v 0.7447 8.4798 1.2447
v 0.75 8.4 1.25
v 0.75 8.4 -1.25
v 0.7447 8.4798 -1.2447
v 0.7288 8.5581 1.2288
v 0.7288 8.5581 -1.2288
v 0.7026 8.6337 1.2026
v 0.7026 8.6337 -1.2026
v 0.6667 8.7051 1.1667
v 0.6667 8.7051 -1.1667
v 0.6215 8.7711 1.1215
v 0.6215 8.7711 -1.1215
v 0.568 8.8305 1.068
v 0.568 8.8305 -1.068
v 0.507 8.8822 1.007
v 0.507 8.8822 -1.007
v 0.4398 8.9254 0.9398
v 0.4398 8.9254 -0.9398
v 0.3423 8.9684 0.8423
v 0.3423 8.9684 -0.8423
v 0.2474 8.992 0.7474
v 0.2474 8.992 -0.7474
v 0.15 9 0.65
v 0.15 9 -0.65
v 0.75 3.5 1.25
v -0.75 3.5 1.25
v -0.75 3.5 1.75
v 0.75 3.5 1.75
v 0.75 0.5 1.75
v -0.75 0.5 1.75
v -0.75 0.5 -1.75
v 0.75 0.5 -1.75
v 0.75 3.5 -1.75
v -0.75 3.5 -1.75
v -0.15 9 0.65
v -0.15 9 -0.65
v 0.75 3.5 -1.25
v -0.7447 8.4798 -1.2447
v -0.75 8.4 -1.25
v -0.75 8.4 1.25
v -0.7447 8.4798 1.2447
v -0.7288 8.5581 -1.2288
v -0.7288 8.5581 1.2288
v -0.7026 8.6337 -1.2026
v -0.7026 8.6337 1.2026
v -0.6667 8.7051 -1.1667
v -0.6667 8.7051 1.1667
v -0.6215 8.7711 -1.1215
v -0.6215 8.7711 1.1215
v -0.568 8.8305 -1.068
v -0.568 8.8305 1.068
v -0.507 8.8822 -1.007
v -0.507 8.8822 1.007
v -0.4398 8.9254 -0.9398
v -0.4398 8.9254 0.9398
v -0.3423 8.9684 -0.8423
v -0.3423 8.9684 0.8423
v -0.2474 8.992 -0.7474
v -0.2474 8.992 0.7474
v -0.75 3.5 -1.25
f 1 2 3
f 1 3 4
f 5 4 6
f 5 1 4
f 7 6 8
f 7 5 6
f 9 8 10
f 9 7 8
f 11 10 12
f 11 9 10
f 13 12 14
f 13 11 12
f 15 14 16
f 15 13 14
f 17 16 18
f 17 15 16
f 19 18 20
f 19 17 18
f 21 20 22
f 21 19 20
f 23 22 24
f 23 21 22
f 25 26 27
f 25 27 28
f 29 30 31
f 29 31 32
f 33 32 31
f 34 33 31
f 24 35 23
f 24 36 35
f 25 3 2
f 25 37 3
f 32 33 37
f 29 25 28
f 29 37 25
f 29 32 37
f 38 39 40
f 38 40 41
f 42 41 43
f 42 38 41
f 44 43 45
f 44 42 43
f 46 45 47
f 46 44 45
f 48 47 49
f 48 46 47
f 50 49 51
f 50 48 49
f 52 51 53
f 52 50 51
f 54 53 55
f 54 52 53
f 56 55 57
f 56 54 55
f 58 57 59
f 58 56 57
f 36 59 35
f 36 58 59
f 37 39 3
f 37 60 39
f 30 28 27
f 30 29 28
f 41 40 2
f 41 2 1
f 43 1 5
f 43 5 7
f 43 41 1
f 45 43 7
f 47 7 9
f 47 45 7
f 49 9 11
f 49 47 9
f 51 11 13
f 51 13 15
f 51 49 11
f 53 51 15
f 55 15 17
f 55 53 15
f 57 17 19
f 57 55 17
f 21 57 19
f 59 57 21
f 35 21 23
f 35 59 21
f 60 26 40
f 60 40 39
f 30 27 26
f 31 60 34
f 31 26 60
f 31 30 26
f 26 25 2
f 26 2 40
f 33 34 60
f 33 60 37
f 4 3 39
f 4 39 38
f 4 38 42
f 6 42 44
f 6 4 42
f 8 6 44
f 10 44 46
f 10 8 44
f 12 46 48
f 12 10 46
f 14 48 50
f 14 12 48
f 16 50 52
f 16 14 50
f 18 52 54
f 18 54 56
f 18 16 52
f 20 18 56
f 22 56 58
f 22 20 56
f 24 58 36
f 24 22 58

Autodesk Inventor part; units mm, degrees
ref_plane "YZ Plane" through (0, 0, 0) normal (1, 0, 0) x (0, 1, 0)
ref_plane "XZ Plane" through (0, 0, 0) normal (0, 1, 0) x (-1, 0, 0)
ref_plane "XY Plane" through (0, 0, 0) normal (0, 0, 1) x (1, 0, 0)
sketch "Sketch1" plane through (0, 0, 0) normal (0, 1, 0) x (-1, 0, 0)
  line L0 (-0.75, -1.6) -> (0.75, -1.6)
  line L1 (0.75, -1.6) -> (0.75, 1.6)
  line L2 (0.75, 1.6) -> (-0.75, 1.6)
  line L3 (-0.75, 1.6) -> (-0.75, -1.6)
  line L4 (-0.75, -1.6) -> (0.75, 1.6) construction
  line L5 (0.75, -1.6) -> (-0.75, 1.6) construction
  line L6 (0.75, 1.6) -> (-0.75, 1.6)
  line L7 (-0.75, 1.6) -> (-0.75, 2.6)
  line L8 (-0.75, 2.6) -> (0.75, 2.6)
  line L9 (0.75, 2.6) -> (0.75, 1.6)
  line L10 (-0.75, -1.6) -> (0.75, -1.6)
  line L11 (0.75, -1.6) -> (0.75, -2.6)
  line L12 (0.75, -2.6) -> (-0.75, -2.6)
  line L13 (-0.75, -2.6) -> (-0.75, -1.6)
  point P0 (0, 0)
  point P1 (0.75, -1.6)
  dimension "d0" = 3.2
  dimension "d1" = 1.5
  dimension "d2" = 1
  dimension "d3" = 1
extrude "Extrusion1" add sketch "Sketch1" along normal blind 0.5 contours L0 L11 L12 L13 | L7 L8 L9 L2
sketch "Sketch2" plane through (0.75, 0, 2.6) normal (1, 0, 0) x (0, 0, -1)
  line L0 (0, 0.5) -> (1, 0.5) projected
  line L1 (0.85, 0.5) -> (4.35, 0.5)
  line L2 (4.35, 0.5) -> (4.35, 1.5)
  line L3 (4.35, 1.5) -> (0.85, 1.5)
  line L4 (0.85, 1.5) -> (0.85, 0.5)
  line L5 (0.85, 1.5) -> (0, 0.5)
  line L6 (5.2, 0) -> (5.2, 0.5) projected
  line L7 (4.35, 1.5) -> (5.2, 0.5)
  line L8 (0, 0) -> (1, 0) construction
  line L9 (0, 0) -> (5.2, 0) construction
  line L10 (2.6, 0) -> (2.6, 2.5684) construction
  line L11 (0, 0.5) -> (5.2, 0.5)
  point P0 (2.6, 0.5)
  dimension "d10" = 3.5
  dimension "d19" = 1
extrude "Extrusion3" add sketch "Sketch2" against normal blind 1.5
sketch "Sketch5" plane through (0.75, 1.5, 1.75) normal (0, 1, 0) x (1, 0, 0)
  line L0 (-1.5, 0) -> (-1.5, 3.5) projected
  line L1 (0, 3.5) -> (0, 0) projected
  line L2 (-1.5, 3.5) -> (0, 3.5)
  line L3 (0, 3.5) -> (0, 0)
  line L4 (0, 0) -> (-1.5, 0)
  line L5 (-1.5, 0) -> (-1.5, 3.5)
  point P0 (-0.75, 1.75)
  point P1 (0, 3.5)
  point P2 (-1.5, 0)
extrude "Extrusion5" add sketch "Sketch5" along normal blind 2
sketch "Sketch6" plane through (0.75, 3.5, 1.75) normal (0, 1, 0) x (1, 0, 0)
  line L0 (-1.5, 3) -> (0, 3)
  line L1 (0, 3) -> (0, 0.5)
  line L2 (0, 0.5) -> (-1.5, 0.5)
  line L3 (-1.5, 0.5) -> (-1.5, 3)
  line L4 (0, 0) -> (0, 3.5) construction
  line L5 (0, 0) -> (0, 0.5) construction
  line L6 (-0.75, 3) -> (-0.75, 3.5) construction
  line L7 (0, 3.5) -> (-1.5, 3.5) construction
  line L8 (-0.75, 0.5) -> (-0.75, 0) construction
  point P0 (-0.75, 1.75)
  point P1 (-1.5, 1.75)
  point P2 (0, 1.75)
  dimension "d20" = 2.5
extrude "Extrusion6" add sketch "Sketch6" along normal blind 5.5
fillet "Fillet1" radius 0.6 4 edges at (0, 9, -1.25) (-0.75, 9, 0) (0, 9, 1.25) (0.75, 9, 0)
sketch "Sketch7" plane through (0, 0, 0) normal (0, -1, 0) x (1, 0, 0)
  line L0 (-0.75, 2.6) -> (0.75, 2.6) projected
  line L1 (-0.75, -2.6) -> (0.75, -2.6)
  line L2 (0.75, -2.6) -> (0.75, 2.6)
  line L3 (0.75, 2.6) -> (-0.75, 2.6)
  line L4 (-0.75, 2.6) -> (-0.75, -2.6)
  line L5 (-0.75, -2.6) -> (0.75, 2.6) construction
  line L6 (0.75, -2.6) -> (-0.75, 2.6) construction
  point P0 (0, 0)
extrude "Extrusion7" cut sketch "Sketch7" against normal blind 0.5
sketch "Sketch8" plane through (0.75, 0.5, -2.6) normal (0, -1, 0) x (1, 0, 0)
  line L0 (-1.5, 5.2) -> (0, 5.2) projected
  line L1 (0, 4.35) -> (-1.5, 4.35) projected
  line L2 (0, 5.2) -> (-1.5, 5.2)
  line L3 (-1.5, 5.2) -> (-1.5, 4.35)
  line L4 (-1.5, 4.35) -> (0, 4.35)
  line L5 (0, 4.35) -> (0, 5.2)
  line L6 (0, 0) -> (-1.5, 0) projected
  line L7 (0, 0.85) -> (-1.5, 0.85) projected
  line L8 (0, 0) -> (-1.5, 0)
  line L9 (-1.5, 0) -> (-1.5, 0.85)
  line L10 (-1.5, 0.85) -> (0, 0.85)
  line L11 (0, 0.85) -> (0, 0)
  point P0 (-0.75, 2.6)
  point P1 (0, 0.85)
extrude "Extrusion8" cut sketch "Sketch8" against normal blind 2
sketch "Sketch4" plane through (0.75, 1.5, 1.75) normal (0, 1, 0) x (1, 0, 0)
  line L0 (-1.5, 3) -> (0, 3)
  line L1 (0, 3) -> (0, 0.5)
  line L2 (0, 0.5) -> (-1.5, 0.5)
  line L3 (-1.5, 0.5) -> (-1.5, 3)
  line L4 (-1.5, 0) -> (-1.5, 3.5) projected
  line L5 (0, 3.5) -> (0, 0) projected
  line L6 (0, 3.5) -> (-1.5, 3.5) projected
  point P0 (-0.75, 1.75)
  point P1 (-1.5, 1.75)
  point P2 (0, 1.75)
  point P3 (-0.75, 3)
  dimension "d13" = 2.5
  dimension "d14" = 0.5
properties part number "LightPipeThin"
